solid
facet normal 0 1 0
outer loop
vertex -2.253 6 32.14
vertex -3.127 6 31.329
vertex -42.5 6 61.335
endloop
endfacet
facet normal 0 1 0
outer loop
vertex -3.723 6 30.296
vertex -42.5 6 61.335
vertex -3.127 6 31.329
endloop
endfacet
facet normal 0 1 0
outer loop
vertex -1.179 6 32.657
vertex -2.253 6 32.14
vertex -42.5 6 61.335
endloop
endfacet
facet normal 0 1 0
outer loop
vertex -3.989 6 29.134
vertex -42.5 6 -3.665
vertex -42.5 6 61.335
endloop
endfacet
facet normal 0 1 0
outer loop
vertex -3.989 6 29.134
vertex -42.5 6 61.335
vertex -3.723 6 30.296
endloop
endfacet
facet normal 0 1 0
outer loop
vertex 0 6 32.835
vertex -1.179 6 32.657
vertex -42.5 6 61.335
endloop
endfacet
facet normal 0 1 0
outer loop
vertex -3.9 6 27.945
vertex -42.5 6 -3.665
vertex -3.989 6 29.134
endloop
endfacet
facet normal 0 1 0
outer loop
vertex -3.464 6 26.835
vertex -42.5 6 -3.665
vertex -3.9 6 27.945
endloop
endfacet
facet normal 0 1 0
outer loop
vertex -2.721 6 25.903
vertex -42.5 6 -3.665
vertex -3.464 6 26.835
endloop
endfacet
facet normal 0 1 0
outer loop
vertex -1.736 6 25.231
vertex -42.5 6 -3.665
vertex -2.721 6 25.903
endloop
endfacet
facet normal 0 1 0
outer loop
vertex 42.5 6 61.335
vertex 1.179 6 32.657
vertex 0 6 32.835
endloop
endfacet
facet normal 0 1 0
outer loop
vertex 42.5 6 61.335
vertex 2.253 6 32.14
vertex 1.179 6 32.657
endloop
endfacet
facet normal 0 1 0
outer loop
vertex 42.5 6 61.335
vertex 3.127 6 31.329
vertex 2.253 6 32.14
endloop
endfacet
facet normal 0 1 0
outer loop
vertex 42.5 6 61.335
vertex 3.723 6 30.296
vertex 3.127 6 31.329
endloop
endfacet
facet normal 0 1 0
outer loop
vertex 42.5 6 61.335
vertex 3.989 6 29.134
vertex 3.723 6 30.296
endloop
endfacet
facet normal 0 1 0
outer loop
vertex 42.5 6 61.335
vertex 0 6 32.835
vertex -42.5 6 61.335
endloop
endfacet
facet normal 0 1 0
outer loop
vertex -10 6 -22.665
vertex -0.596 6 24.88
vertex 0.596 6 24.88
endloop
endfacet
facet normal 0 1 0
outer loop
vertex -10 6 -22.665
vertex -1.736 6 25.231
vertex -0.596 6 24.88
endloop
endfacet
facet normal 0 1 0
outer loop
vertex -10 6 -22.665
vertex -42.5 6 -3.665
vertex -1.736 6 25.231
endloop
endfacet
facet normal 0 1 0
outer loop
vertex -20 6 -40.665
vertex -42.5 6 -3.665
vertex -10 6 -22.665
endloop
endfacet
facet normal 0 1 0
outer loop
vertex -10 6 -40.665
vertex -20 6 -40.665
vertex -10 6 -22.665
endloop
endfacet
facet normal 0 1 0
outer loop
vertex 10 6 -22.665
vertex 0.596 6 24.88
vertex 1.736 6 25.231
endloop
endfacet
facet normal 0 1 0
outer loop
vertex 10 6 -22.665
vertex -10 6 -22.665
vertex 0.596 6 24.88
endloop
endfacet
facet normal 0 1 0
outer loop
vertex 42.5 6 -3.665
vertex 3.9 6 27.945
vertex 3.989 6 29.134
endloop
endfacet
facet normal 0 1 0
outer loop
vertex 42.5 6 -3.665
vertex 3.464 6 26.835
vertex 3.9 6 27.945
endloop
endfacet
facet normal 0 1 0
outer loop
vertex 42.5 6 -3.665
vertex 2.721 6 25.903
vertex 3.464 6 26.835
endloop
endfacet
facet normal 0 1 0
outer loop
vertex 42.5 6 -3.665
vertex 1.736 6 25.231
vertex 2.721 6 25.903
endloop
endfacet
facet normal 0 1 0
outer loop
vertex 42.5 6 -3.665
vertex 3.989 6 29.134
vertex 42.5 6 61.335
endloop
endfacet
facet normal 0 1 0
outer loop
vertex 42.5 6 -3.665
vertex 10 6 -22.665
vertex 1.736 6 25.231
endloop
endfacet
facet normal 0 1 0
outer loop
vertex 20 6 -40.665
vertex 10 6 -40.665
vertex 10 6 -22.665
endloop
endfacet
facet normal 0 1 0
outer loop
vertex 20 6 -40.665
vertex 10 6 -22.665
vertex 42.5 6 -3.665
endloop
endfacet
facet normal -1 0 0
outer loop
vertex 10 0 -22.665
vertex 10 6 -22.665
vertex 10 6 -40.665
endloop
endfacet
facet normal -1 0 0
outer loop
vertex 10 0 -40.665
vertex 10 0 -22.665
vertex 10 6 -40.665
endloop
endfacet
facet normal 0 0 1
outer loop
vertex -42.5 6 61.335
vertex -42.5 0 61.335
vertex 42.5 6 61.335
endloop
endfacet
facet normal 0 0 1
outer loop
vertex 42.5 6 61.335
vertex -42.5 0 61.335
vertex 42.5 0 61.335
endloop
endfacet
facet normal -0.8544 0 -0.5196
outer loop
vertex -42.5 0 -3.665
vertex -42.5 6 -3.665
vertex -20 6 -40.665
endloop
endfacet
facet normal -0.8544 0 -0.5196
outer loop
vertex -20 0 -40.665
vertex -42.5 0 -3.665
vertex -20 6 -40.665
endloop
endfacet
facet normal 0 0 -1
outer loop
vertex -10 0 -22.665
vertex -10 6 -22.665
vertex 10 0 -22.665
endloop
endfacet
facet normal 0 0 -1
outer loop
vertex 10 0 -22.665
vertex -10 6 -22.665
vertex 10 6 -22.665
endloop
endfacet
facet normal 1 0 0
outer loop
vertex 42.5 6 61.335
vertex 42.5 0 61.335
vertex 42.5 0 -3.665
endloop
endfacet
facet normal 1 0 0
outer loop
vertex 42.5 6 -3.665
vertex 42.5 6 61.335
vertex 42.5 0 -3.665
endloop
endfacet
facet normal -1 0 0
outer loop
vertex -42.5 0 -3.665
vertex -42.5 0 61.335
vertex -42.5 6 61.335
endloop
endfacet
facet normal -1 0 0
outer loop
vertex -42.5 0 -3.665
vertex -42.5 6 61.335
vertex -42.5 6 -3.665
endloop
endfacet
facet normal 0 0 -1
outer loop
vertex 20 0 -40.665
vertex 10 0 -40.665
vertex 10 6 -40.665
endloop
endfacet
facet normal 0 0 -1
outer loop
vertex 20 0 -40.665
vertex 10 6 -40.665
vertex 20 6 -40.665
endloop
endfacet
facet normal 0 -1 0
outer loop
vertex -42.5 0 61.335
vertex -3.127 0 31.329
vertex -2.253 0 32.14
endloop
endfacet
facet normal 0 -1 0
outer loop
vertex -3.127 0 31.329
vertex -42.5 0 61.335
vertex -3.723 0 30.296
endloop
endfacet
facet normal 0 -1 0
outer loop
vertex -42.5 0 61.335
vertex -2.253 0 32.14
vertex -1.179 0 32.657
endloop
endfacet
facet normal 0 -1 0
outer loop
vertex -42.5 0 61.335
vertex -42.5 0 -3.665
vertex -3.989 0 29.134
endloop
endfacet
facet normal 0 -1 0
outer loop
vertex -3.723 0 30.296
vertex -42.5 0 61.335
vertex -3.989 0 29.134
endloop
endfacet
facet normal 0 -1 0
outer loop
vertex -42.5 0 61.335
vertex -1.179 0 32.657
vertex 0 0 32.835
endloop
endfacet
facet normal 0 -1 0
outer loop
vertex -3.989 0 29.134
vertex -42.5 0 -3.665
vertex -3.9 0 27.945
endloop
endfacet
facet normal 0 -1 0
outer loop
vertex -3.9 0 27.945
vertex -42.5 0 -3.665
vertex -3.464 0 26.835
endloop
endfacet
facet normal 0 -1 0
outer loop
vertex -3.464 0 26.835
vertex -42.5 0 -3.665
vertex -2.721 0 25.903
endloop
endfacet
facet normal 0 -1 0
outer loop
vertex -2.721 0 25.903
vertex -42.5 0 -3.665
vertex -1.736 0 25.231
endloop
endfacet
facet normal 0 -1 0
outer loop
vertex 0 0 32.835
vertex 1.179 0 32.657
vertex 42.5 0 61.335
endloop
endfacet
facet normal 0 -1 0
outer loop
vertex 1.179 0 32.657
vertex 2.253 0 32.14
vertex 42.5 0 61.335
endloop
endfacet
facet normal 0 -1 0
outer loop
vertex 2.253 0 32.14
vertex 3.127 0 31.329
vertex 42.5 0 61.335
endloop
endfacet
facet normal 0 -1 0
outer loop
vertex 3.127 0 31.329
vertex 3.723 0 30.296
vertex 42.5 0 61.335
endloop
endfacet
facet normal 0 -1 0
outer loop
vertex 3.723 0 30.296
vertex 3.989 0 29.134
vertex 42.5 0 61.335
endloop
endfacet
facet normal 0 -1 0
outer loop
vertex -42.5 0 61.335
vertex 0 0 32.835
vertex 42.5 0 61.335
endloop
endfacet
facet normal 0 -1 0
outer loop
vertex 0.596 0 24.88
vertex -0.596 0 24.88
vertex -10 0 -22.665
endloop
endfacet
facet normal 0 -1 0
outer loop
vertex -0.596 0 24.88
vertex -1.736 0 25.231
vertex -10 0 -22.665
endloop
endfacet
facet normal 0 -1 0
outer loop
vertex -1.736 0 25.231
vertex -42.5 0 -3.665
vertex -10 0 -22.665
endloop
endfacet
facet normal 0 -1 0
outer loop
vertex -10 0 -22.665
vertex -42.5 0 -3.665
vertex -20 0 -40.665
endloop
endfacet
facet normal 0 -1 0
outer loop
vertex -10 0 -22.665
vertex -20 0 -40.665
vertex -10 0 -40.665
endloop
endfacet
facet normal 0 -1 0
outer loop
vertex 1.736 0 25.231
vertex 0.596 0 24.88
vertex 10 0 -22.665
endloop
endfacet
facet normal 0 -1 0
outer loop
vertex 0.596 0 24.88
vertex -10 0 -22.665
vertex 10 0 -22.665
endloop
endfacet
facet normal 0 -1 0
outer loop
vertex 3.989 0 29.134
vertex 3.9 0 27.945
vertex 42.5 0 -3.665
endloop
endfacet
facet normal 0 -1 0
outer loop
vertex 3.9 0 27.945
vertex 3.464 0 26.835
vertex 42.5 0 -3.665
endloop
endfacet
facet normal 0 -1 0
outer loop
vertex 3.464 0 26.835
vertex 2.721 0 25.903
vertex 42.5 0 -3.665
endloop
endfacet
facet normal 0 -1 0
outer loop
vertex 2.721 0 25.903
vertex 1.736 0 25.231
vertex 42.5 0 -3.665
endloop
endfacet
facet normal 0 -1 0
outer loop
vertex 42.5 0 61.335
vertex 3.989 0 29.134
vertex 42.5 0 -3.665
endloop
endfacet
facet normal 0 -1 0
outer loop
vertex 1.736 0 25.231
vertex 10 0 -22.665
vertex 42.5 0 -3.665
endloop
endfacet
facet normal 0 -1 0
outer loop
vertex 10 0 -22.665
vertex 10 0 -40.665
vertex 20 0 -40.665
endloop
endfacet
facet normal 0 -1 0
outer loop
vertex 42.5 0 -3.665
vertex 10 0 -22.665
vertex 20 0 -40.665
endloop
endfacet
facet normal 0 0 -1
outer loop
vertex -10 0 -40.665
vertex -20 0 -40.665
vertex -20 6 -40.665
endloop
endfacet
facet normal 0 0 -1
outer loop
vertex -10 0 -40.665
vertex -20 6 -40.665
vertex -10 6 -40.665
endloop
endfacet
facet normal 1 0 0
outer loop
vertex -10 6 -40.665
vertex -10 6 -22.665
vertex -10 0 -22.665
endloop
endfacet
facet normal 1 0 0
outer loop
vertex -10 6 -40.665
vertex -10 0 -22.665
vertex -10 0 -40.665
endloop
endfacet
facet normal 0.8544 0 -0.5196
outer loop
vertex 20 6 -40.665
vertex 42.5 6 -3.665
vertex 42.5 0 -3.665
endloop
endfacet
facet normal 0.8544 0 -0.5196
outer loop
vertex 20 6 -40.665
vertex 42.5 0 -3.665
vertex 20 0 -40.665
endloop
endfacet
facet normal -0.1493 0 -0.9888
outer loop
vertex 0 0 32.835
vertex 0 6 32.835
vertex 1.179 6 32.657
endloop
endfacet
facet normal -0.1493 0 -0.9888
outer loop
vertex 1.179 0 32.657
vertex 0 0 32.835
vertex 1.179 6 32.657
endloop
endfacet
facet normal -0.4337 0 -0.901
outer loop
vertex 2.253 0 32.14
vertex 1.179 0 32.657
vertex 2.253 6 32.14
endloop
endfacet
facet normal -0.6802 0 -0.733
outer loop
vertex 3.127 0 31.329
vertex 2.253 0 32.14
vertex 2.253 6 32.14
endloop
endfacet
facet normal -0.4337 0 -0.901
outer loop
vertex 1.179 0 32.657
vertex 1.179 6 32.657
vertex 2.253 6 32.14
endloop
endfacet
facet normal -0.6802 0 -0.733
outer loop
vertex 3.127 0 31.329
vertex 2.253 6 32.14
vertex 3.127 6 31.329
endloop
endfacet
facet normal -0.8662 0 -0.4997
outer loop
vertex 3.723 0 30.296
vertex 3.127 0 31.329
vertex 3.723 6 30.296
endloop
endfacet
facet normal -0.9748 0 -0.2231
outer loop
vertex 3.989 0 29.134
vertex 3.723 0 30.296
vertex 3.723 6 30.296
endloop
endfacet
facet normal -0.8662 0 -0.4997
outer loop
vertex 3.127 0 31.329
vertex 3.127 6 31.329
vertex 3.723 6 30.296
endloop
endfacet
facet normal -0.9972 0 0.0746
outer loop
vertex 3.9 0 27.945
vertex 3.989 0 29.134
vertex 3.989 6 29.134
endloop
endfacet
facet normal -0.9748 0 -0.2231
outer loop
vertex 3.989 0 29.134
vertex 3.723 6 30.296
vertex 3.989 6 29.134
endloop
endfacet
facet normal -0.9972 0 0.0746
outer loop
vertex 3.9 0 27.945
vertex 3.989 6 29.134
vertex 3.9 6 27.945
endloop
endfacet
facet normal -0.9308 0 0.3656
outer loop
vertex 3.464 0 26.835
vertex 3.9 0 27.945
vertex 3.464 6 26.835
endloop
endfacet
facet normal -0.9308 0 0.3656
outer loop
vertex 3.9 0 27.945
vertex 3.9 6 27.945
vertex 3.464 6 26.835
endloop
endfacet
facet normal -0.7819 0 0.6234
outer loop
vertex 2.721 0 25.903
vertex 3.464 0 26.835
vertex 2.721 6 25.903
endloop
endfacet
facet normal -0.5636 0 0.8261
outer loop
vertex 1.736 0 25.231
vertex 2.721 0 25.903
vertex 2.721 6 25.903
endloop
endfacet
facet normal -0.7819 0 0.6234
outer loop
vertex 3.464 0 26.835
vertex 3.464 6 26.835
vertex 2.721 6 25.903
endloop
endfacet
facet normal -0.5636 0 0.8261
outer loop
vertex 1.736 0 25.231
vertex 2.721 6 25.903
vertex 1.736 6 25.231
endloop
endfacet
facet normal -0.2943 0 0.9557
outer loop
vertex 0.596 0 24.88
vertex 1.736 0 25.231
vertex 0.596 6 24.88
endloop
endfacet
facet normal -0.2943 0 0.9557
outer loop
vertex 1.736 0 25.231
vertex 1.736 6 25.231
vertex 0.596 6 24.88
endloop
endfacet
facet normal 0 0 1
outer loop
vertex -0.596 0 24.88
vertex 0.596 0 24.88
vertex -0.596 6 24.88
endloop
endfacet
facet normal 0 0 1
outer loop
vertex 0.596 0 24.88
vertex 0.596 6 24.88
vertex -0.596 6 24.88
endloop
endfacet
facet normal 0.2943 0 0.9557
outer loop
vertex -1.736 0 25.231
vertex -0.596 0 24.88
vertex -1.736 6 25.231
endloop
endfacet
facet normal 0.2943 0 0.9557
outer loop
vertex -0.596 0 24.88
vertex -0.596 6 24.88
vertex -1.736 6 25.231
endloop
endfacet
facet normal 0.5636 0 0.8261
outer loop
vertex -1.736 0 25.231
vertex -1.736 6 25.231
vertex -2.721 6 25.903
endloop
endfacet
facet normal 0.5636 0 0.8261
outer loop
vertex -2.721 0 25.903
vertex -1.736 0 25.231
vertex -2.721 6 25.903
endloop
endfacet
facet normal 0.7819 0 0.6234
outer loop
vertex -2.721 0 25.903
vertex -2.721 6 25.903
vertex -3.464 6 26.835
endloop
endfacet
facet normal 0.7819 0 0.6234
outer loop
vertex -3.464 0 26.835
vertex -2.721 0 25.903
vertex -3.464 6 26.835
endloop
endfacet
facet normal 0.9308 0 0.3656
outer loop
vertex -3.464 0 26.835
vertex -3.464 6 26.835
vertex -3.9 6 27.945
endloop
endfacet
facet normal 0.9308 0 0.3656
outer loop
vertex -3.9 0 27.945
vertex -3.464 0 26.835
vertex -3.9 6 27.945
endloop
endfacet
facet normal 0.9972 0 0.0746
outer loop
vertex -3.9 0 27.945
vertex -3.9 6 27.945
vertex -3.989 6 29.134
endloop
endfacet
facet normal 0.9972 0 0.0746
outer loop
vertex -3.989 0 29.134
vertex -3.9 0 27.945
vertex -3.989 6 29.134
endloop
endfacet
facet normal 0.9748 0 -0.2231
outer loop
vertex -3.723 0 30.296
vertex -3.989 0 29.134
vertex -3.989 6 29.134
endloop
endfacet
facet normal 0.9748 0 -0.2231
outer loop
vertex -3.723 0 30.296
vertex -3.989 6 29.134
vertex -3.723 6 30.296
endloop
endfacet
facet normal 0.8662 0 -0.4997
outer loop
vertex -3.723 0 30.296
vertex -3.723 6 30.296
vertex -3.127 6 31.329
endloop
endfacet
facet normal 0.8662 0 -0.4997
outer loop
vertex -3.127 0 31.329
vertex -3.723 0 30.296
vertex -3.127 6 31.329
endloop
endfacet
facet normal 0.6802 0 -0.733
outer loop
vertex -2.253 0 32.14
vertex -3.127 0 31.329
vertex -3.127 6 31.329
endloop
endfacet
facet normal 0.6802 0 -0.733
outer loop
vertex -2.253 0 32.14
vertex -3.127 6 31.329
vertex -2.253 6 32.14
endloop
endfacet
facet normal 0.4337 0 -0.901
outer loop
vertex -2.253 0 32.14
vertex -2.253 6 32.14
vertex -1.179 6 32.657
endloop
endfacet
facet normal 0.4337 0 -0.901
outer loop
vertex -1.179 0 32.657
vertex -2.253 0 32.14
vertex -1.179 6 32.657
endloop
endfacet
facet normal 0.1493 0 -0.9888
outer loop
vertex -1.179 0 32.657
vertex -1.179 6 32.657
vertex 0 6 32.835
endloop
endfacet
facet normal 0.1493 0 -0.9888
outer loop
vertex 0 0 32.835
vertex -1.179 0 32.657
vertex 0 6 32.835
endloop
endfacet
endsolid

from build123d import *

# Parameters (mm, degrees)
SKETCH_1_W          = 85
SKETCH_1_H          = 102
EXTRUDE_1_DEPTH     = 6
CUT_EXTRUDE_1_DEPTH = 75.861411438
SKETCH_3_R          = 4
CUT_EXTRUDE_2_DEPTH = 75.861411438
SKETCH_4_W          = 20
SKETCH_4_H          = 18
CUT_EXTRUDE_3_DEPTH = 75.861411438


with BuildPart() as part:
    # Эскиз1 → Вытянуть1 (new body)
    with BuildSketch(Plane(origin=(0, 0, 0), x_dir=(1, 0, 0), z_dir=(0, 1, 0))):
        with Locations((0, -10.334989382)):
            Rectangle(SKETCH_1_W, SKETCH_1_H)
    extrude(amount=EXTRUDE_1_DEPTH)

    # Эскиз2 → Вырез-Вытянуть1 (cut, through all)
    with BuildSketch(Plane(origin=(0, 6, 0), x_dir=(1, 0, 0), z_dir=(0, 1, 0))):
        Polygon((42.5, 3.665010618), (20, 40.665010618), (42.5, 40.665010618), align=None)
        Polygon((-42.5, 40.665010618), (-42.5, 3.665010618), (-20, 40.665010618), align=None)
    extrude(amount=-CUT_EXTRUDE_1_DEPTH, mode=Mode.SUBTRACT)

    # Эскиз3 → Вырез-Вытянуть2 (cut, through all)
    with BuildSketch(Plane(origin=(0, 6, 0), x_dir=(1, 0, 0), z_dir=(0, 1, 0))):
        with Locations(Location((0, -28.834989382, 0), (0, 0, 270))):
            Circle(SKETCH_3_R)
    extrude(amount=-CUT_EXTRUDE_2_DEPTH, mode=Mode.SUBTRACT)

    # Эскиз4 → Вырез-Вытянуть3 (cut, through all)
    with BuildSketch(Plane(origin=(0, 6, 0), x_dir=(1, 0, 0), z_dir=(0, 1, 0))):
        with Locations((3.2e-08, 31.665010618)):
            Rectangle(SKETCH_4_W, SKETCH_4_H)
    extrude(amount=-CUT_EXTRUDE_3_DEPTH, mode=Mode.SUBTRACT)


solid = part.part
